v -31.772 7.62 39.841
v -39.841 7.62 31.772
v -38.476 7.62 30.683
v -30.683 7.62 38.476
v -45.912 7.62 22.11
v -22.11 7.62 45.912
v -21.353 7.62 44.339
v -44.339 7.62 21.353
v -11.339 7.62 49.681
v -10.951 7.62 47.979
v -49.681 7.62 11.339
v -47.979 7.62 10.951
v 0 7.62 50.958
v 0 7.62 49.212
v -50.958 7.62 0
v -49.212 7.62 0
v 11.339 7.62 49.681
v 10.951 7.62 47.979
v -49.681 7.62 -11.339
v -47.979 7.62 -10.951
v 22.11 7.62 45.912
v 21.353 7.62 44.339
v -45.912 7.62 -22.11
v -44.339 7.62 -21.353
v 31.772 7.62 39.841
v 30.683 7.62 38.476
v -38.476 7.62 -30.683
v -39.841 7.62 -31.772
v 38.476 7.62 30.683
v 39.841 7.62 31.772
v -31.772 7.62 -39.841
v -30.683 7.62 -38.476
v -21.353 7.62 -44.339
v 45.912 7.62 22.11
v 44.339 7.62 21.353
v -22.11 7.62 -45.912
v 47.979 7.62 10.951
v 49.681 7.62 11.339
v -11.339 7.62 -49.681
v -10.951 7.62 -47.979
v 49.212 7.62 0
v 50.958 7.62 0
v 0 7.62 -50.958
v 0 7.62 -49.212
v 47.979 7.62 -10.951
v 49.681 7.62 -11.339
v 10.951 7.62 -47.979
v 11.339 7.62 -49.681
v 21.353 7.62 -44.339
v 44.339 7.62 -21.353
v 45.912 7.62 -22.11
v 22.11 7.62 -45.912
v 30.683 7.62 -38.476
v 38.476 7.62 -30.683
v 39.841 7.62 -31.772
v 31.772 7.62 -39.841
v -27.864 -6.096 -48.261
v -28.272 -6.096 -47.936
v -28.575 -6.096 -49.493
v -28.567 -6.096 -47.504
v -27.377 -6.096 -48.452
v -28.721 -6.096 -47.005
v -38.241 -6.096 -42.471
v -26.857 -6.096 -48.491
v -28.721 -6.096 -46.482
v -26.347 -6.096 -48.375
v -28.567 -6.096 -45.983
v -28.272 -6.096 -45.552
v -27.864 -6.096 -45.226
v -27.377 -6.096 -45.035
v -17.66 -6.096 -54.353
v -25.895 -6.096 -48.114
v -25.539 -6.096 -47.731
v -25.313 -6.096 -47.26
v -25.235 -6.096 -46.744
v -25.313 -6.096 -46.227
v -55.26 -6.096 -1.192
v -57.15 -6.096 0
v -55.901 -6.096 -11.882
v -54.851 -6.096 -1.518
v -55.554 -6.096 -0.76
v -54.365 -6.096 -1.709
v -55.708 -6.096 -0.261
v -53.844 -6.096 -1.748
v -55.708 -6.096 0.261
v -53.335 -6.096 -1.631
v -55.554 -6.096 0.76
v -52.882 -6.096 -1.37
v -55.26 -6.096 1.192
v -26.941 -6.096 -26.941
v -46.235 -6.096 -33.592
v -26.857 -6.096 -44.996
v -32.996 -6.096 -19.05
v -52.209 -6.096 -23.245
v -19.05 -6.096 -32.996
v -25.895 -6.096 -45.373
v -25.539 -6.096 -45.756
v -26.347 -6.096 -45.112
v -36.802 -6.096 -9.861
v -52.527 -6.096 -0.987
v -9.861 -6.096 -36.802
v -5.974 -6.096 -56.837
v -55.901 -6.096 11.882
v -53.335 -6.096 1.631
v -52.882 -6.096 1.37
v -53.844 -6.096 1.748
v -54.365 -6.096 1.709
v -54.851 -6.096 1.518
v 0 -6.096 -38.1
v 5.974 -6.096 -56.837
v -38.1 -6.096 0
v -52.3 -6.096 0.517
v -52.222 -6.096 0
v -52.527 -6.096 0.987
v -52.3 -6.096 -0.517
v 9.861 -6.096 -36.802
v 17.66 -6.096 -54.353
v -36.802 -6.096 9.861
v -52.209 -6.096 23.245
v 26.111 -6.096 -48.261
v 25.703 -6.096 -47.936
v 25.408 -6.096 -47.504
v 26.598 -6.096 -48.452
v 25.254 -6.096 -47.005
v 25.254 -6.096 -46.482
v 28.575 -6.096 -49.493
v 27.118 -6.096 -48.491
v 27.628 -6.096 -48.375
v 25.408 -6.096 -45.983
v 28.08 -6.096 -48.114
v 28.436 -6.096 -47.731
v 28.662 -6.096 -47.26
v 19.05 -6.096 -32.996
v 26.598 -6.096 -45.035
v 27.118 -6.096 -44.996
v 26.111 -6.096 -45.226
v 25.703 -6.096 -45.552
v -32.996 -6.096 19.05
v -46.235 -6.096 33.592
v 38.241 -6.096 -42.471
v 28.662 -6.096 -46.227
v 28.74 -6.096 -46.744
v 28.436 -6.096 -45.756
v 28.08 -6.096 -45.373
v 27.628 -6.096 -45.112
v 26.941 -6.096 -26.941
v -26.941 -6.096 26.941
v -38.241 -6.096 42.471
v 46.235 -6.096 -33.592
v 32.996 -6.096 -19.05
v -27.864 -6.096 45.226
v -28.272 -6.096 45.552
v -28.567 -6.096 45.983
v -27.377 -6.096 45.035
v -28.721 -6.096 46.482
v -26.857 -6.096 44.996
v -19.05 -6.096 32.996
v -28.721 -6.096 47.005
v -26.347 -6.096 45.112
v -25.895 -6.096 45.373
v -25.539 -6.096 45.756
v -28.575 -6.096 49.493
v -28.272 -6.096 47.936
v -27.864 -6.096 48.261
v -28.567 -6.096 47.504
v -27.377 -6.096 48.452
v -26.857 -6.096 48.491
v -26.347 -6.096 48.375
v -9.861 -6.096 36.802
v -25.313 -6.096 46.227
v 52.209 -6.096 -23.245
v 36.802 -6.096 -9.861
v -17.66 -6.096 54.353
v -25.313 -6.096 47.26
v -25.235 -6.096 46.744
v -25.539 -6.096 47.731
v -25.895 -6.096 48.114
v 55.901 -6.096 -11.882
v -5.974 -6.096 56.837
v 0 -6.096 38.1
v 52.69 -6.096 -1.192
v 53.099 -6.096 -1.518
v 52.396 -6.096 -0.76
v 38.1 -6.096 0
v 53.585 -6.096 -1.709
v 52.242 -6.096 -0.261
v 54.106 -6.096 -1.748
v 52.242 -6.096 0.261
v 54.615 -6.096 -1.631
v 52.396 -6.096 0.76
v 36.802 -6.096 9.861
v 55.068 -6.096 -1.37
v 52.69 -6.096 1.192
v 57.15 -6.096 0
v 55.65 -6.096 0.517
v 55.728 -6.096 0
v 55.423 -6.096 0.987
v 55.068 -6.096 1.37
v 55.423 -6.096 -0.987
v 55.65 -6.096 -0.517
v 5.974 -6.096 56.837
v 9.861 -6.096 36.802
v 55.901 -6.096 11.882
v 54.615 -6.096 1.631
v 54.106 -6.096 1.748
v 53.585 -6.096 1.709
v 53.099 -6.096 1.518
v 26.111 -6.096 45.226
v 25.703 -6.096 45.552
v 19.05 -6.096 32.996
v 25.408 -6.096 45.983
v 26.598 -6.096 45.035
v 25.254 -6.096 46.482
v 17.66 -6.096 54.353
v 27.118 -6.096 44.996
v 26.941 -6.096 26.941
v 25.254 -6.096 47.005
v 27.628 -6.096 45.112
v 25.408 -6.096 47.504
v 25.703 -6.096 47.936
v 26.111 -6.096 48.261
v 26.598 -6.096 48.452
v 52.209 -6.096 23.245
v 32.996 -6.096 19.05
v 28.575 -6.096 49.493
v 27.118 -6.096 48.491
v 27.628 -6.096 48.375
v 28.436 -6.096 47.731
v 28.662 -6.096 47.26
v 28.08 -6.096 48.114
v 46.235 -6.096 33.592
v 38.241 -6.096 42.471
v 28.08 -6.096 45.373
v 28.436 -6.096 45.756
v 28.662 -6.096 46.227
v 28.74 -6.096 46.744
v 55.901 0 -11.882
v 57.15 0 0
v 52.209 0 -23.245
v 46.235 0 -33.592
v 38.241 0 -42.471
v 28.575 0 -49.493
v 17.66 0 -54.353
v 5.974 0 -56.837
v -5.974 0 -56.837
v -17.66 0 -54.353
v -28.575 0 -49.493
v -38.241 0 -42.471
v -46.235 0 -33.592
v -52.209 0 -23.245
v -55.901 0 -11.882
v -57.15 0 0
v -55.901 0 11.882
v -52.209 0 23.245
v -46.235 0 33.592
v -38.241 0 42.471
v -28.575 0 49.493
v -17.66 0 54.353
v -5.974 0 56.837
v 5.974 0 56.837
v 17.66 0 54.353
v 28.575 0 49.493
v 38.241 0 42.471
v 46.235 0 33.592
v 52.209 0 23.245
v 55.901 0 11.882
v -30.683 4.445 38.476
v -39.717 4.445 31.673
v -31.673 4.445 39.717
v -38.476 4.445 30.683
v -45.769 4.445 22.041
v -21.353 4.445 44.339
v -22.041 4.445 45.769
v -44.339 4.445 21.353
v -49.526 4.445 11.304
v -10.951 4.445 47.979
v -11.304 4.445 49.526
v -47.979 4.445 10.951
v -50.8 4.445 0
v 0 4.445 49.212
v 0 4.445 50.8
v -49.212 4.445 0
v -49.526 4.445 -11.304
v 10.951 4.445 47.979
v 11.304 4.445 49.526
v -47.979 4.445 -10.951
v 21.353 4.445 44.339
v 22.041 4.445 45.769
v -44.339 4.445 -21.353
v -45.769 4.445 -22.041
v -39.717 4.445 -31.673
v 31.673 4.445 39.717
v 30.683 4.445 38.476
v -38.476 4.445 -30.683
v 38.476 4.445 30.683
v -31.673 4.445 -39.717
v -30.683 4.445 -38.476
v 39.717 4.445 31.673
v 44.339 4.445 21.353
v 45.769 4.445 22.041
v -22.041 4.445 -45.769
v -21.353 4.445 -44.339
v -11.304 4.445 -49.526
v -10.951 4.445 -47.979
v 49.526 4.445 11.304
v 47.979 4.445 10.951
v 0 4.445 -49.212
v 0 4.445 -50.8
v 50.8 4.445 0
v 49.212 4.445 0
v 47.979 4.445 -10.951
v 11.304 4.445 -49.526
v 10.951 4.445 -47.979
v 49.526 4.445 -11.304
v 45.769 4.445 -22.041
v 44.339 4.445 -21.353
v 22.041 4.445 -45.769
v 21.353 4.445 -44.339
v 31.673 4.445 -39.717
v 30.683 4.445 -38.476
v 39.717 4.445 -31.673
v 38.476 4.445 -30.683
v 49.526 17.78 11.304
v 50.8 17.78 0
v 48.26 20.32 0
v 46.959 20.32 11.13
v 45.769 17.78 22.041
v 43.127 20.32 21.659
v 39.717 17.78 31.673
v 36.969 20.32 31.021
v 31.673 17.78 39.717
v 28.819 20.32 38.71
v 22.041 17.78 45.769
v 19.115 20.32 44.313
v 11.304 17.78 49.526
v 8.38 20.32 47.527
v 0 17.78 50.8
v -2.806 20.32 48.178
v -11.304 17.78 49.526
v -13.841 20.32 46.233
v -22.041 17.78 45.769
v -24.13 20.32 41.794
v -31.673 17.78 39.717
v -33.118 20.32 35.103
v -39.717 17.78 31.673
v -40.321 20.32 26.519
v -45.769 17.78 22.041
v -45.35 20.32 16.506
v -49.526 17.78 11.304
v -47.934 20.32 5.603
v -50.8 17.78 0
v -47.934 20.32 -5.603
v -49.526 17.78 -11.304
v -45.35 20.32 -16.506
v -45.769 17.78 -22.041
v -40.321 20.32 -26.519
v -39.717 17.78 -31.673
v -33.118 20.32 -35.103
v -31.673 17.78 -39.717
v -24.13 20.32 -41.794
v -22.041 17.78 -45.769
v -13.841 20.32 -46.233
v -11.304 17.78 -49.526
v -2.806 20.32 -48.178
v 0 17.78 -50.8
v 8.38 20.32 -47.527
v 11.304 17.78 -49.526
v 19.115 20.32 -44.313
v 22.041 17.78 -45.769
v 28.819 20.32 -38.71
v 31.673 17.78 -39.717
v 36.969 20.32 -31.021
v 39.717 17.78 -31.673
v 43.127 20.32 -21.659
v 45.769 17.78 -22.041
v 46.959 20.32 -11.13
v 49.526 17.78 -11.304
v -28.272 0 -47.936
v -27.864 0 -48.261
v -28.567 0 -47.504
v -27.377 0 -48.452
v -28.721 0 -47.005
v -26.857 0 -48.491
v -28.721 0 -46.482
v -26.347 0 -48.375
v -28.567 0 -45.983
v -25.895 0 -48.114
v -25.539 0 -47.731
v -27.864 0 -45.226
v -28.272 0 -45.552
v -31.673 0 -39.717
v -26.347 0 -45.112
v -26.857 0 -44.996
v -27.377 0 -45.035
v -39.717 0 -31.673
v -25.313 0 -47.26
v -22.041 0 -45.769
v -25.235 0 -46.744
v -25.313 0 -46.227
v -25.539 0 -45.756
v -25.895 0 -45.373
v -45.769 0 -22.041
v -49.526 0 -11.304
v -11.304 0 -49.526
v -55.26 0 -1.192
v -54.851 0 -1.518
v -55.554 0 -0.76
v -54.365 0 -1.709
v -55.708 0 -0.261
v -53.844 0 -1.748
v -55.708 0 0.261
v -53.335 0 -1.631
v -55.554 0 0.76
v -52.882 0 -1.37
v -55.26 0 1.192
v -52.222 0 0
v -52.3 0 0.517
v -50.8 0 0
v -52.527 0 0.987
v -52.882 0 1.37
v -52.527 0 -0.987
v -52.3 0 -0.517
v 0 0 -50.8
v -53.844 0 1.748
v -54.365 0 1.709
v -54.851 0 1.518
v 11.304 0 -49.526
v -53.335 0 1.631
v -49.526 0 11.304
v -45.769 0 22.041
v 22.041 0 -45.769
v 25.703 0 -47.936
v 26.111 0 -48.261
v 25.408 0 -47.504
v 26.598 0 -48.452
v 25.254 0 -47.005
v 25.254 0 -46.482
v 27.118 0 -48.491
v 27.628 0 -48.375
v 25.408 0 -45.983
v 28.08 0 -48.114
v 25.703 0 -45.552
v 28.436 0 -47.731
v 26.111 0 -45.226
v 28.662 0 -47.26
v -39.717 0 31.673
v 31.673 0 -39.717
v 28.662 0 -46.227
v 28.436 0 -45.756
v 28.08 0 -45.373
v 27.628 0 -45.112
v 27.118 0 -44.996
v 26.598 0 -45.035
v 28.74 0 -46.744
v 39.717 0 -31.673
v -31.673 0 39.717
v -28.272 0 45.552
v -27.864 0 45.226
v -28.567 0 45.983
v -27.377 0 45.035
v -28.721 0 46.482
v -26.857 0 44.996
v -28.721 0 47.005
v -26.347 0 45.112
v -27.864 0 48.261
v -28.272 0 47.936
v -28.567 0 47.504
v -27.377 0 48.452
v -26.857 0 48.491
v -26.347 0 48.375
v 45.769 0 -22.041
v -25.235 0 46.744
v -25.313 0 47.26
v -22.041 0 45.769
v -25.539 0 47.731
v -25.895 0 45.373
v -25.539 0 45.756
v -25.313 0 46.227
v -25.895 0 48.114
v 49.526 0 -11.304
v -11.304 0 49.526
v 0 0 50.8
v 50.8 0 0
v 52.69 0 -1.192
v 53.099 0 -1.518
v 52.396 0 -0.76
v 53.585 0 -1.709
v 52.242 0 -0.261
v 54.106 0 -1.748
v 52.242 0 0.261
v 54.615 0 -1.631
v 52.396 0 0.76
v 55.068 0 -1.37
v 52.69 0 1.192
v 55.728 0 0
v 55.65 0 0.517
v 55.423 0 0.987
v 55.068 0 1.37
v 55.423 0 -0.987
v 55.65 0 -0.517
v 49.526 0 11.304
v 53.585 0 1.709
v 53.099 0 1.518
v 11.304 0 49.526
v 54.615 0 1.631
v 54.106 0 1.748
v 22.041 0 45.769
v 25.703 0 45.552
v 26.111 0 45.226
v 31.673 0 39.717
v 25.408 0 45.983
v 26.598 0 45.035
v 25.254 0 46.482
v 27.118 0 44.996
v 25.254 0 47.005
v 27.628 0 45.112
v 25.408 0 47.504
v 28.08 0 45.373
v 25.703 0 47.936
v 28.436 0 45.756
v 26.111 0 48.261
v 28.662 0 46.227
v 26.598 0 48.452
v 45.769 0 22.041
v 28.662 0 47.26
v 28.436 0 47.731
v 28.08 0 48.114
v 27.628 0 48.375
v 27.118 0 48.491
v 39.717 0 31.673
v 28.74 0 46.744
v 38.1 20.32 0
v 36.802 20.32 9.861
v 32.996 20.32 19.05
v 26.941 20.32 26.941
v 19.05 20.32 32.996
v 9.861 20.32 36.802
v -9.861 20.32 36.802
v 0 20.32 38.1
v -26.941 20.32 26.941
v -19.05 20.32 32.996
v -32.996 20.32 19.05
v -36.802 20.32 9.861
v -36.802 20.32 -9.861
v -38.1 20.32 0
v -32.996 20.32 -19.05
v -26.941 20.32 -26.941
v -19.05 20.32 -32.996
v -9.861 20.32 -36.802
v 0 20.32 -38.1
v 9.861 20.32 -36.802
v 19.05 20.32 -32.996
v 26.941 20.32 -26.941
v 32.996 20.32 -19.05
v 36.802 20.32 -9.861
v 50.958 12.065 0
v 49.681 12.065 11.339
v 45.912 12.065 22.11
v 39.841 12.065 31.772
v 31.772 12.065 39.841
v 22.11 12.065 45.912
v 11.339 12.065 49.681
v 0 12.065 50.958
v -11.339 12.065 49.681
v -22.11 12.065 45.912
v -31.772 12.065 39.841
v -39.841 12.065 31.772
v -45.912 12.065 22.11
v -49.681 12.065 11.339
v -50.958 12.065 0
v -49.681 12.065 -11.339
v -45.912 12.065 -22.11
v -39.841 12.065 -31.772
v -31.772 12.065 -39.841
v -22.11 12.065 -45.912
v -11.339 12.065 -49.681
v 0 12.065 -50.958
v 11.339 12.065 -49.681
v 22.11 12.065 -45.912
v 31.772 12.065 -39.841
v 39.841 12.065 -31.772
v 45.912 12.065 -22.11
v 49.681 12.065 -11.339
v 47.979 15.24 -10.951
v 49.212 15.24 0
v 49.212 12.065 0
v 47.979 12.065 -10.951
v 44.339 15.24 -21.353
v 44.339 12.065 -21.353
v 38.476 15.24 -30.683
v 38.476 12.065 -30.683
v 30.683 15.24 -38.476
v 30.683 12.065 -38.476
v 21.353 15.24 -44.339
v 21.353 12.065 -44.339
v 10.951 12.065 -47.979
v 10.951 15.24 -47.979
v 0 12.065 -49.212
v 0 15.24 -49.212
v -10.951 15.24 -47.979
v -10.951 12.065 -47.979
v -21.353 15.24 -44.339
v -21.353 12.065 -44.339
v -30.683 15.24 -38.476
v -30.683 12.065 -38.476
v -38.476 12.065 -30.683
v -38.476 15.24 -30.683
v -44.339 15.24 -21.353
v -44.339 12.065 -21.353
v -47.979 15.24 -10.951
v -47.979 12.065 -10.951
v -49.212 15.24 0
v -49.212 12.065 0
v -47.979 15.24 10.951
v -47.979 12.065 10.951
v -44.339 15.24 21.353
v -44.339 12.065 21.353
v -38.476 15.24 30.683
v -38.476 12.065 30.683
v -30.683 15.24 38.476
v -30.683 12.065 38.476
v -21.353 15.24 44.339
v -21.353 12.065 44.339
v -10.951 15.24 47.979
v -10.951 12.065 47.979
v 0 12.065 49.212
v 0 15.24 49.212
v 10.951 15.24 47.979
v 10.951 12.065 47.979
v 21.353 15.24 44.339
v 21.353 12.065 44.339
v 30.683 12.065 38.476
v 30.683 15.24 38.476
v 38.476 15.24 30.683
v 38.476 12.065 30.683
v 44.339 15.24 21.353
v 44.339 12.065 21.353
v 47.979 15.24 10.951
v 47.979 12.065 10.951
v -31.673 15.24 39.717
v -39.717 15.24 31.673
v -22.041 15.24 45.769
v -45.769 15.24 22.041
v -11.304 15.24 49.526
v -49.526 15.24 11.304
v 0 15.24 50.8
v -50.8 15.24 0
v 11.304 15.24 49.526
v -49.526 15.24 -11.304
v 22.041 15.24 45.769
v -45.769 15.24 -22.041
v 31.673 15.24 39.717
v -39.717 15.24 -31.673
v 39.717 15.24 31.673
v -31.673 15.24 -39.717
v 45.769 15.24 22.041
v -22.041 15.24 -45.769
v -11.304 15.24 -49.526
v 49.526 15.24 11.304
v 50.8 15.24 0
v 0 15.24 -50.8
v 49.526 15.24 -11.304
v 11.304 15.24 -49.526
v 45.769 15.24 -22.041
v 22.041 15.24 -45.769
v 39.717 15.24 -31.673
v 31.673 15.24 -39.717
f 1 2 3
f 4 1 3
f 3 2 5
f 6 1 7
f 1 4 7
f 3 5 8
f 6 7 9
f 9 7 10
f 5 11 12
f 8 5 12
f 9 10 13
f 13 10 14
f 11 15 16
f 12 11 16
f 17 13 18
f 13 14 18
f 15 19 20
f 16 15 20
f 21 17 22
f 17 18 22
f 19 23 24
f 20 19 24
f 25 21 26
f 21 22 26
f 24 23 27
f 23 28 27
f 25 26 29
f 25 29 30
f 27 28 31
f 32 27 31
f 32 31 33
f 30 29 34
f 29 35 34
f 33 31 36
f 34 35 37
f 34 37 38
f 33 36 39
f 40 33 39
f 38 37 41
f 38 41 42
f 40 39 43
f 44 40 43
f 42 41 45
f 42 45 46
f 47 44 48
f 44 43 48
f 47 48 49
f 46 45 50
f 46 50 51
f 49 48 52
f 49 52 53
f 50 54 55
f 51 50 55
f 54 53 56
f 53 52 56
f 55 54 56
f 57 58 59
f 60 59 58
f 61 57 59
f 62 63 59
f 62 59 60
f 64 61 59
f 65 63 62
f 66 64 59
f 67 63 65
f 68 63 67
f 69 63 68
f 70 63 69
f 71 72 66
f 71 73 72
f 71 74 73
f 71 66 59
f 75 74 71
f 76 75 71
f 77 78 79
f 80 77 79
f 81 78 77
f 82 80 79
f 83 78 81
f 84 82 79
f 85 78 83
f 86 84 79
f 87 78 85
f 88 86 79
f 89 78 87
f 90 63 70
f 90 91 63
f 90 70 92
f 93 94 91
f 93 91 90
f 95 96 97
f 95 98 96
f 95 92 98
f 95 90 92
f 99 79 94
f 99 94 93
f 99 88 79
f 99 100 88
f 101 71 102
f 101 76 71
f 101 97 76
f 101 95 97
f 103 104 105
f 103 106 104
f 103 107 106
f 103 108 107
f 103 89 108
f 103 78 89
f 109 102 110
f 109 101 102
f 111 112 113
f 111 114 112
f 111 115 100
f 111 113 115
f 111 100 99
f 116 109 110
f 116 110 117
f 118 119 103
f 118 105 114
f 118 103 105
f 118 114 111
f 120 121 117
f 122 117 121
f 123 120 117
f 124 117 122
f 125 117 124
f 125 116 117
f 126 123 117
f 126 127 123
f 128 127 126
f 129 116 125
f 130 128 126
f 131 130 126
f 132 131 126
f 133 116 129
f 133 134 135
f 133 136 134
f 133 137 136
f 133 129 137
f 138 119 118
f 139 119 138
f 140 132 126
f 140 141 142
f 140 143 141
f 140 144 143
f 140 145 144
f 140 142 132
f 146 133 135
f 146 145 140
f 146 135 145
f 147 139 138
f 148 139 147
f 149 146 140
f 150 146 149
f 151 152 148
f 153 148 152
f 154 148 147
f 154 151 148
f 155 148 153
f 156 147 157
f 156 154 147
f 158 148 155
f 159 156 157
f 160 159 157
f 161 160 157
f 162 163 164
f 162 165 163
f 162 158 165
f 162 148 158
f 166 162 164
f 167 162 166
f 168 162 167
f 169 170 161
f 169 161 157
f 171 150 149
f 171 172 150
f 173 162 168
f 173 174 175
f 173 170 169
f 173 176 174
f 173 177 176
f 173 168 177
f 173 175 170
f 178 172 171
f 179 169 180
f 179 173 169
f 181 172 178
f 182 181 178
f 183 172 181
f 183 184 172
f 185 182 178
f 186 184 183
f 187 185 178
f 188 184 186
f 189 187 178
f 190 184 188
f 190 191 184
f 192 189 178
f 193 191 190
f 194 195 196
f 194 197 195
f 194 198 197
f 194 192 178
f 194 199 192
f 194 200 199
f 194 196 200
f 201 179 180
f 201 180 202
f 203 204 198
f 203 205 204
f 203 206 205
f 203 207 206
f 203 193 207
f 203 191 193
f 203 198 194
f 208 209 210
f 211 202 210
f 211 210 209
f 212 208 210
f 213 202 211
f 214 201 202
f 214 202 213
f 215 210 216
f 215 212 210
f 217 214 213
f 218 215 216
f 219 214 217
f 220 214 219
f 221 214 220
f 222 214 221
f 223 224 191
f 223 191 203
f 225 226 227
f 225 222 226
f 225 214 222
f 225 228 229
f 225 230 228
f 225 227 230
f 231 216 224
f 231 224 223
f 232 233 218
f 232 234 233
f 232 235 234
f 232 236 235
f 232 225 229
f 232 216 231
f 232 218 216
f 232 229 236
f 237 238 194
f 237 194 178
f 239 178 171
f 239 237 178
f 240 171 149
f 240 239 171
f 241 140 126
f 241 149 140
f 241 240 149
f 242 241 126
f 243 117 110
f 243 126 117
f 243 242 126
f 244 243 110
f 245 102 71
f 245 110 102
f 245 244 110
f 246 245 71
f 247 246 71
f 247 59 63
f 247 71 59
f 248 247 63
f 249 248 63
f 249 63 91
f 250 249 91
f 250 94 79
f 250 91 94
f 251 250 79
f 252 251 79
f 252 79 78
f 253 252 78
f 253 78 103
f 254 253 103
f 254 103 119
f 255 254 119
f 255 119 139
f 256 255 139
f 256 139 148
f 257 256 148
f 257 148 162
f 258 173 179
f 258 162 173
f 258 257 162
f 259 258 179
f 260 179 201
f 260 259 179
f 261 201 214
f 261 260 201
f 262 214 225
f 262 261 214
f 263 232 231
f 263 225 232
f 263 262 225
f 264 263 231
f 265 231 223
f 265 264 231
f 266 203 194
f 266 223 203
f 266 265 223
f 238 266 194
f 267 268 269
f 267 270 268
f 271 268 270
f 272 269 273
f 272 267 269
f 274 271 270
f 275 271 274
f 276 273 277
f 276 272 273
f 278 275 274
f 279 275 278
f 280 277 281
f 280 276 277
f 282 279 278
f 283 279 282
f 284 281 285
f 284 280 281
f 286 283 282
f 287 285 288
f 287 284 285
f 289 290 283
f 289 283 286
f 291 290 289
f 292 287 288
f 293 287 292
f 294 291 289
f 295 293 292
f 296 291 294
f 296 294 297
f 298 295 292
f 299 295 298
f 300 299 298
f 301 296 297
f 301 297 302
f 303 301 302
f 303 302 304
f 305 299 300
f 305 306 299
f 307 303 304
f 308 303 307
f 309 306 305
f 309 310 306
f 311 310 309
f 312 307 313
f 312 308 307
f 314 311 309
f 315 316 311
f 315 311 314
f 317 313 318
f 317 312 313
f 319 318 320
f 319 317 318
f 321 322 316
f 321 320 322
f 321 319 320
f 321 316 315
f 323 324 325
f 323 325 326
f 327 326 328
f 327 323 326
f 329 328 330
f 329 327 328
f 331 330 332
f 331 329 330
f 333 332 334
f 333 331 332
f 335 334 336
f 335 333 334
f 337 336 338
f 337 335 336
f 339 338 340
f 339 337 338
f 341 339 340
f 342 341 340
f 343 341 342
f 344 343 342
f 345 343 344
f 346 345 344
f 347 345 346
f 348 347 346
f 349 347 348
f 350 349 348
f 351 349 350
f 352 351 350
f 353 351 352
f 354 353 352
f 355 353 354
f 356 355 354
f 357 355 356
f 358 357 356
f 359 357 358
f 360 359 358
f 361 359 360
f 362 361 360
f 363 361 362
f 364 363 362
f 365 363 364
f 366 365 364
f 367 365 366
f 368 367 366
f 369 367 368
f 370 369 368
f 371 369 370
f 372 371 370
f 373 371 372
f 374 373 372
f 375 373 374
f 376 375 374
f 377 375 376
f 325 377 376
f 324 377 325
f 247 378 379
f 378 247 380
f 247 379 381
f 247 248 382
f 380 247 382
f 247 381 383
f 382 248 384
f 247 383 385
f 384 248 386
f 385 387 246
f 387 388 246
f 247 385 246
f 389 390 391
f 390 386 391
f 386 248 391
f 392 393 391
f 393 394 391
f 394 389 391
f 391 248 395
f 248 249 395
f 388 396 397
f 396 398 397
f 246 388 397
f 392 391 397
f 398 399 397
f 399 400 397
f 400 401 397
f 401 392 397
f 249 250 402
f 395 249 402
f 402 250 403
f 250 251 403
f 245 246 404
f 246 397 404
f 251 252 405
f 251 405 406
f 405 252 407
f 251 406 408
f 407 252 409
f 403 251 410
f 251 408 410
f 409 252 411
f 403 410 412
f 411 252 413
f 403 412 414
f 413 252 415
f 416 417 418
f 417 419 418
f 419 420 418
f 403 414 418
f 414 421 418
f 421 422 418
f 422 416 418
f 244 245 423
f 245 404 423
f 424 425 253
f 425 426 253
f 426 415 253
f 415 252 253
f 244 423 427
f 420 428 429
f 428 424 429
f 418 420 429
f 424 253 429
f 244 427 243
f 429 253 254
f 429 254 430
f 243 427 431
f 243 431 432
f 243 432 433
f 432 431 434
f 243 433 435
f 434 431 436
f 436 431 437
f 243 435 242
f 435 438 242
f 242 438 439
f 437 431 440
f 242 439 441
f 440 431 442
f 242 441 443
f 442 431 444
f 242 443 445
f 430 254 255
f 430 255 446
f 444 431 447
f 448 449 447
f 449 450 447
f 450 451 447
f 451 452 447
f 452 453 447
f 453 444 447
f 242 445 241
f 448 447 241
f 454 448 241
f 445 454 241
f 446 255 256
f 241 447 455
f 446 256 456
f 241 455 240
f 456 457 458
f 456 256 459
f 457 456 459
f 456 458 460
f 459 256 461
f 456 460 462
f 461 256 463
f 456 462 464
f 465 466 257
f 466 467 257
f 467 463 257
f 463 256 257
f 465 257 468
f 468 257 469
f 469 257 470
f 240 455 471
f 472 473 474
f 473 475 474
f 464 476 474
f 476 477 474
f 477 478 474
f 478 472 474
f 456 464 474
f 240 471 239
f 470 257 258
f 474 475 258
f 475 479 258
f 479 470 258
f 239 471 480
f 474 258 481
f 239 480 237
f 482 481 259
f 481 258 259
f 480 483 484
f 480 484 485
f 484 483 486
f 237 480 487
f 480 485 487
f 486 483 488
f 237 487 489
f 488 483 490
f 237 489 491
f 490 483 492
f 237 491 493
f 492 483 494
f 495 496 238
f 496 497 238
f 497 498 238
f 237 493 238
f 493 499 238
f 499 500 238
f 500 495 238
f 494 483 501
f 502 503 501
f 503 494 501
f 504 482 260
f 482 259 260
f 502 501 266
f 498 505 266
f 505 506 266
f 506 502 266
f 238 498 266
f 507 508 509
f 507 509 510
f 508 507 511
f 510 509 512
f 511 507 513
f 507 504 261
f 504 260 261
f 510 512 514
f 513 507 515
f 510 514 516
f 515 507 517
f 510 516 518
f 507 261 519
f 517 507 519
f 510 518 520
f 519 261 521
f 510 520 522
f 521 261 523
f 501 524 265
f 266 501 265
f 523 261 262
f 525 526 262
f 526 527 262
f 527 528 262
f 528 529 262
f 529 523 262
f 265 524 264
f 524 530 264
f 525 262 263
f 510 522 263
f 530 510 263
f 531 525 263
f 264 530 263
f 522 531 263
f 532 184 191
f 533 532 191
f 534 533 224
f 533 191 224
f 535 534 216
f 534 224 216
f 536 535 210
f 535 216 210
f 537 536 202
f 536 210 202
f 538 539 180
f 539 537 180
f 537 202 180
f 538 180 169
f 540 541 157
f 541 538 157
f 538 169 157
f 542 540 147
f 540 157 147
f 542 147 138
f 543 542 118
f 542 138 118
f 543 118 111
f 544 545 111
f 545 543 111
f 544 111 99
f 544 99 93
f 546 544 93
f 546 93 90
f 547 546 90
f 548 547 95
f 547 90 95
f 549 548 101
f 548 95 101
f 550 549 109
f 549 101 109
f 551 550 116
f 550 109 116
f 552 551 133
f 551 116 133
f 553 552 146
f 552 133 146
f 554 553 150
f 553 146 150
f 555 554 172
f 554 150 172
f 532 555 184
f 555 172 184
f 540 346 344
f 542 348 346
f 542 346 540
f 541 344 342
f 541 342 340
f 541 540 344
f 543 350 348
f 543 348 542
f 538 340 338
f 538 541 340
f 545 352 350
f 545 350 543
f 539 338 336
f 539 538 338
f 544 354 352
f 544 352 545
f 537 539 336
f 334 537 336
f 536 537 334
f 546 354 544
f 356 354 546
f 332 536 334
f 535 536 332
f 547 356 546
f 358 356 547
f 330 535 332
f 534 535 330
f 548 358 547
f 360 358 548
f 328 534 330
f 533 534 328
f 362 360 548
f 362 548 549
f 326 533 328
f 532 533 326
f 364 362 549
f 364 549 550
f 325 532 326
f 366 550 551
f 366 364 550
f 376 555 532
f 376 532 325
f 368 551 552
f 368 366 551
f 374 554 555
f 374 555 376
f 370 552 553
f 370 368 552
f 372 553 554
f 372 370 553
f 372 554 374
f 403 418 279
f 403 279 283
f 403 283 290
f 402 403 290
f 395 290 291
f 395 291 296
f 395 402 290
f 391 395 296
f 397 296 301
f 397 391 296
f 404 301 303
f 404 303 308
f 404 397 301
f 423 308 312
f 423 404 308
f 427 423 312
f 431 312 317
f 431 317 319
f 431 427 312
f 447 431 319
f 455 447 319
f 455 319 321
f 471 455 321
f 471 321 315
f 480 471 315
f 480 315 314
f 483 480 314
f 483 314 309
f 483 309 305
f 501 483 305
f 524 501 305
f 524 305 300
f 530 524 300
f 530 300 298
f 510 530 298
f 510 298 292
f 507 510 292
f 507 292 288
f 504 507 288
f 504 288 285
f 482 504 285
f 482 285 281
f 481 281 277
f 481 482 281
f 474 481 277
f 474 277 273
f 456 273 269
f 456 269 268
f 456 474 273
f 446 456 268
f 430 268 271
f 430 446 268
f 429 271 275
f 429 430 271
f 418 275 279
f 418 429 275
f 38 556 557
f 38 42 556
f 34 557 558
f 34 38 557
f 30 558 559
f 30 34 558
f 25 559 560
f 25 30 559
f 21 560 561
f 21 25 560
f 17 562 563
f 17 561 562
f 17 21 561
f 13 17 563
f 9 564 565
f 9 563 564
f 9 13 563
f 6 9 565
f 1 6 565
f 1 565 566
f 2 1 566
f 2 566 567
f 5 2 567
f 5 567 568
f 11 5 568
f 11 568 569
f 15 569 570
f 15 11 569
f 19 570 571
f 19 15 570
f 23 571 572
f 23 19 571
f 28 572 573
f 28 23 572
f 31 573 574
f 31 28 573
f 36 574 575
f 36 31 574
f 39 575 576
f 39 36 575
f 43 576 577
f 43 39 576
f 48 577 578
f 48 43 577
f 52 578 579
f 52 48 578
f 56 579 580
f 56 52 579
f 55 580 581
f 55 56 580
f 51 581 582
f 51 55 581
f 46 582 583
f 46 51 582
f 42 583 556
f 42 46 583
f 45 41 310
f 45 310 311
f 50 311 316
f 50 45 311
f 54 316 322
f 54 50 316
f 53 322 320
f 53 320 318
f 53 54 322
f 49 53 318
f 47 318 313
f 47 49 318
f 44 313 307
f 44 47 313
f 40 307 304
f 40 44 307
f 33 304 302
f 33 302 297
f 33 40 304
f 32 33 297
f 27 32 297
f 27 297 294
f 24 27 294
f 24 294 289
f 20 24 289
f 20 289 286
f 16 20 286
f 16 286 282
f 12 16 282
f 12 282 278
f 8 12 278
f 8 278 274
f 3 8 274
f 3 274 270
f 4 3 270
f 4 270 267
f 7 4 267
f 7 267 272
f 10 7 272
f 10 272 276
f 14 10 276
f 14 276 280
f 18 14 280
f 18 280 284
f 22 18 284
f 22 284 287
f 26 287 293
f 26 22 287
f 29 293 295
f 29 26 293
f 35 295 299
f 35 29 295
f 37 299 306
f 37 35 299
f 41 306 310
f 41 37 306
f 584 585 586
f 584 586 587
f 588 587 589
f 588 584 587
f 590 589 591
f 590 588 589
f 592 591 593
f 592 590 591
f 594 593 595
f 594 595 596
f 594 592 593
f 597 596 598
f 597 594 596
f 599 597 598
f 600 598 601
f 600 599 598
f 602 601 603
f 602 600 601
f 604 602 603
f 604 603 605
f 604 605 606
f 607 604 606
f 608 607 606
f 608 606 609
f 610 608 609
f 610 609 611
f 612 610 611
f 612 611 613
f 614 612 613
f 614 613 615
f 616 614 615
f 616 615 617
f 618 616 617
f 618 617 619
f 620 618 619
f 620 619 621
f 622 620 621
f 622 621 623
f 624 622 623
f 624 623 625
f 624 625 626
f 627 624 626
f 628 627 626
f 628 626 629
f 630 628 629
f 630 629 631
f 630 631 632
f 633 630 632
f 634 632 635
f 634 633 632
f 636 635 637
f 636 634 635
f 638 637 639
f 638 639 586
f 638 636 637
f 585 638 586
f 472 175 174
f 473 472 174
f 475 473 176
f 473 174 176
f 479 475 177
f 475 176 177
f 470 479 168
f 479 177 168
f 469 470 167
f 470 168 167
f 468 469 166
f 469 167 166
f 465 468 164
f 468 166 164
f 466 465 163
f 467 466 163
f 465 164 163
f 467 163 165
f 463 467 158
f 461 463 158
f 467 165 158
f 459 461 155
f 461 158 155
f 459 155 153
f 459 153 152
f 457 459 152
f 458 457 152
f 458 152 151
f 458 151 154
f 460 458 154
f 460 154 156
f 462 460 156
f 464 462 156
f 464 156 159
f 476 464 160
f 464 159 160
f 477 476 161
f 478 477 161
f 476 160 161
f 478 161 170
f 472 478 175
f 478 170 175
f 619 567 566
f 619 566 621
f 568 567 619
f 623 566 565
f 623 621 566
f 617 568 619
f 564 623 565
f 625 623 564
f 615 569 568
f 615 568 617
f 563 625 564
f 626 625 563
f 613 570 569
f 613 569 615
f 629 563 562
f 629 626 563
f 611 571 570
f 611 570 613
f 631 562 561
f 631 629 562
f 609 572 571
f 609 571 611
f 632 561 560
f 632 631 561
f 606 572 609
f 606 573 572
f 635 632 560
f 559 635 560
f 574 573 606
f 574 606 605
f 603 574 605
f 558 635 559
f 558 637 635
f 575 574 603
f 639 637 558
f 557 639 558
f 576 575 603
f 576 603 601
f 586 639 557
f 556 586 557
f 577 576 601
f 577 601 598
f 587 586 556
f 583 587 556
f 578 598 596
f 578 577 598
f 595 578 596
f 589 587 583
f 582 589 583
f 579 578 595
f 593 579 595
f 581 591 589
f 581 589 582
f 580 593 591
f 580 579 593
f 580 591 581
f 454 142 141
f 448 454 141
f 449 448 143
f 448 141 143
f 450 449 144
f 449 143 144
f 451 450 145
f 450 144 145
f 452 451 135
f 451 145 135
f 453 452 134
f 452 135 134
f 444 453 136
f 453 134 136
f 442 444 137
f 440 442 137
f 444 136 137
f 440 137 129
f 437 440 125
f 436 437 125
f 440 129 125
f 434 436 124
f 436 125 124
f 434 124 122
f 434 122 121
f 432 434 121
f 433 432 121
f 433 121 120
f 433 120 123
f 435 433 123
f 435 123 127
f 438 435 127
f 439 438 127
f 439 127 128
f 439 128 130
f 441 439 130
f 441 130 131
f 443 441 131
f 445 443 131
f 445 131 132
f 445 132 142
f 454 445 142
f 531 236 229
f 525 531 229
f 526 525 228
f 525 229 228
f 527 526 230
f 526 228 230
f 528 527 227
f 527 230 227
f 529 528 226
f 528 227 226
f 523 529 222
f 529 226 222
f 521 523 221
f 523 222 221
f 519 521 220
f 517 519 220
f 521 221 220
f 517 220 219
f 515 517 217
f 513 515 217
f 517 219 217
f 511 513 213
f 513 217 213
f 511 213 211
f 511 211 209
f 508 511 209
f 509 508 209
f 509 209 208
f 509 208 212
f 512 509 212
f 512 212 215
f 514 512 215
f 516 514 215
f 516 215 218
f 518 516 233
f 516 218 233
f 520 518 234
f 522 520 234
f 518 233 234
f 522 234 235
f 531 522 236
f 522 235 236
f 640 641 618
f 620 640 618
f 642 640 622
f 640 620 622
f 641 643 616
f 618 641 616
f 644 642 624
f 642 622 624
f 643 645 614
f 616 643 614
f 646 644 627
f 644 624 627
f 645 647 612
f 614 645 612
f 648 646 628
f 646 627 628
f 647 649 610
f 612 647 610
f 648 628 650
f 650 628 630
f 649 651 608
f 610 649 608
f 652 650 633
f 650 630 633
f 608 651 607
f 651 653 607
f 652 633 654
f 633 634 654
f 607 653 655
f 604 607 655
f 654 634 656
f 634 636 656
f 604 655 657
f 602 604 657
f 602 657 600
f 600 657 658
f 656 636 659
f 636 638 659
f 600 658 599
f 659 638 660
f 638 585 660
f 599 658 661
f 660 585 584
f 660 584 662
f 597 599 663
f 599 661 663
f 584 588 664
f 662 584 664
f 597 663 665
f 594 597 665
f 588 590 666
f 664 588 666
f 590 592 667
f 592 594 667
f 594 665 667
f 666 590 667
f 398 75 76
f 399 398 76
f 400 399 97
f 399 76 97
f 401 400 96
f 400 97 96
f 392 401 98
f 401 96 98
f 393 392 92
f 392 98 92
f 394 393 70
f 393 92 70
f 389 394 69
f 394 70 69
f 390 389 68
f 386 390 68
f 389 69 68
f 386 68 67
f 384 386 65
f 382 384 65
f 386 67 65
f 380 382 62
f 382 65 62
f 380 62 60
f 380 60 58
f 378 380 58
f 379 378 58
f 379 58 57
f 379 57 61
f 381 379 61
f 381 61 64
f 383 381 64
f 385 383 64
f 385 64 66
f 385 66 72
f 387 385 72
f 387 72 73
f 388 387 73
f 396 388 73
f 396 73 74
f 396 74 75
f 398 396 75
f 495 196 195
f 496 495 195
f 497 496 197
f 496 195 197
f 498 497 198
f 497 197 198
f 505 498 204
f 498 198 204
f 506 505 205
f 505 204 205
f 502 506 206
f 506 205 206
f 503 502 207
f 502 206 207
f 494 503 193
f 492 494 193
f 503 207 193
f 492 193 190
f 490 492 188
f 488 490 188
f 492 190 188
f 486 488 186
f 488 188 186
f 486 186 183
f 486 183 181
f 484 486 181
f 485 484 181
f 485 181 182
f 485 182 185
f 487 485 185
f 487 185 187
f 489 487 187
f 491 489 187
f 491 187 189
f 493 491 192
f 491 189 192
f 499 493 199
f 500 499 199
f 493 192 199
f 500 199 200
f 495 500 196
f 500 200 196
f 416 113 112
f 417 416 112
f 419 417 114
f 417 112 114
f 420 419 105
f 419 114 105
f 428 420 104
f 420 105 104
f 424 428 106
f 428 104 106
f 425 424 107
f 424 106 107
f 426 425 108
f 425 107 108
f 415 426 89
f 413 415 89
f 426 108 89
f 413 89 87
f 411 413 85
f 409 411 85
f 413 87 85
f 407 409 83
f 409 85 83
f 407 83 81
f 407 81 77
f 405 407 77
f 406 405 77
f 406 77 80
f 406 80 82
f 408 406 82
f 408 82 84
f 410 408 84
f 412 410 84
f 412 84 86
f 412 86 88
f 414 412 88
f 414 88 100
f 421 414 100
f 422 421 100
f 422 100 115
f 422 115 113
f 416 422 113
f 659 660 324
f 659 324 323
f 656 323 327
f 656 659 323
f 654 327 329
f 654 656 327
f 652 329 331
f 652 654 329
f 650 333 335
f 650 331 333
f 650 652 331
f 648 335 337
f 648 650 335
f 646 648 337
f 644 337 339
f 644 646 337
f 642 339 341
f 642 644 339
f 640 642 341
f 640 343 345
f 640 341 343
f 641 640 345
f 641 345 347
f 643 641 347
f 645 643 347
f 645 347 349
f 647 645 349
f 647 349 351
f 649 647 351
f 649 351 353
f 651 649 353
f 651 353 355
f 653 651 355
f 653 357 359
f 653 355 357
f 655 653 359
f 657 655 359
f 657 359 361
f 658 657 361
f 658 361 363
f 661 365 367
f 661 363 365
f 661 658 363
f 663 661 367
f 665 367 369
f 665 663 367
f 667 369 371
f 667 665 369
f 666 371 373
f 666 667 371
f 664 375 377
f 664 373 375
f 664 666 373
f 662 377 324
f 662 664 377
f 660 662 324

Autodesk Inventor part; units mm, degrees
ref_plane "YZ Plane" through (0, 0, 0) normal (1, 0, 0) x (0, 1, 0)
ref_plane "XZ Plane" through (0, 0, 0) normal (0, 1, 0) x (-1, 0, 0)
ref_plane "XY Plane" through (0, 0, 0) normal (0, 0, 1) x (1, 0, 0)
sketch "Sketch1" plane through (0, 0, 0) normal (0, 1, 0) x (-1, 0, 0)
  circle A0 centre (0, 0) radius 50.8
  dimension "d0" = 101.6
extrude "Extrusion1" add sketch "Sketch1" along normal blind 7.62
sketch "Sketch2" plane through (0, 7.62, 0) normal (0, 1, 0) x (1, 0, 0)
  circle A0 centre (0, 0) radius 49.2125
  circle A1 centre (0, 0) radius 50.8
  dimension "d3" = 98.425
extrude "Extrusion2" cut sketch "Sketch2" against normal blind 3.175
sketch "Sketch3" plane through (0, 7.62, 0) normal (0, 1, 0) x (1, 0, 0)
  circle A0 centre (0, 0) radius 50.9584
extrude "Extrusion3" add sketch "Sketch3" along normal blind 7.62
sketch "Sketch4" plane through (0, 15.24, 0) normal (0, 1, 0) x (1, 0, 0)
  point P0 (0, 0)
sketch "Sketch5" plane through (0, 15.24, 0) normal (0, 1, 0) x (1, 0, 0)
  circle A0 centre (0, 0) radius 49.2125
  circle A1 centre (0, 0) radius 50.9584
  dimension "d8" = 98.425
extrude "Extrusion4" cut sketch "Sketch5" against normal blind 3.175
sketch "Sketch6" plane through (0, 15.24, 0) normal (0, 1, 0) x (1, 0, 0)
  circle A0 centre (0, 0) radius 50.8
  dimension "d11" = 101.6
extrude "Extrusion5" add sketch "Sketch6" along normal blind 5.08
sketch "Sketch7" plane through (0, 0, 0) normal (0, -1, 0) x (1, 0, 0)
  circle A0 centre (0, 0) radius 57.15
  dimension "d14" = 114.3
extrude "Extrusion6" add sketch "Sketch7" along normal blind 6.096
chamfer "Chamfer1" distance 2.54 angle 45 1 edges at (-50.8, 20.32, 0)
sketch "Sketch8" plane through (0, -6.096, 0) normal (0, -1, 0) x (1, 0, 0)
  circle A0 centre (0, 0) radius 50.8
  circle A1 centre (53.975, 0) radius 1.7526
  circle A2 centre (26.9875, 46.7437) radius 1.7526
  circle A3 centre (-26.9875, 46.7437) radius 1.7526
  circle A4 centre (-53.975, 0) radius 1.7526
  circle A5 centre (-26.9875, -46.7437) radius 1.7526
  circle A6 centre (26.9875, -46.7437) radius 1.7526
  dimension "d20" = 3.5052
  dimension "d21" = 53.975
  dimension "d24" = 360
extrude "Extrusion7" cut sketch "Sketch8" against normal blind 6.096 contours A1 | A2 | A3 | A4 | A5 | A6
sketch "Sketch9" plane through (0, -6.096, 0) normal (0, -1, 0) x (1, 0, 0)
  circle A0 centre (0, 0) radius 12.7
  circle A1 centre (0, 0) radius 1.27
  dimension "d28" = 25.4
  dimension "d29" = 2.54
extrude "Extrusion8" cut sketch "Sketch9" against normal blind 127 contours A1
sketch "Sketch10" plane through (0, -6.096, 0) normal (0, -1, 0) x (1, 0, 0)
  circle A0 centre (0, 0) radius 1.27 projected
  circle A1 centre (0, 0) radius 38.1
  dimension "d33" = 76.2
extrude "Extrusion9" cut sketch "Sketch10" against normal blind 9.525
sketch "Sketch11" plane through (0, 3.429, 0) normal (0, -1, 0) x (1, 0, 0)
  circle A0 centre (0, 0) radius 12.7
  circle A1 centre (0, 0) radius 1.27
  dimension "d36" = 25.4
extrude "Extrusion10" add sketch "Sketch11" along normal blind 9.525
sketch "Sketch12" plane through (0, 20.32, 0) normal (0, 1, 0) x (1, 0, 0)
  circle A0 centre (0, 0) radius 1.27 projected
  circle A1 centre (0, 0) radius 38.1
extrude "Extrusion11" cut sketch "Sketch12" against normal blind 508
sketch "Sketch13" plane through (0, -6.096, 0) normal (0, -1, 0) x (1, 0, 0)
  point P0 (0, 0)
properties part number "O ring Dome 2"
